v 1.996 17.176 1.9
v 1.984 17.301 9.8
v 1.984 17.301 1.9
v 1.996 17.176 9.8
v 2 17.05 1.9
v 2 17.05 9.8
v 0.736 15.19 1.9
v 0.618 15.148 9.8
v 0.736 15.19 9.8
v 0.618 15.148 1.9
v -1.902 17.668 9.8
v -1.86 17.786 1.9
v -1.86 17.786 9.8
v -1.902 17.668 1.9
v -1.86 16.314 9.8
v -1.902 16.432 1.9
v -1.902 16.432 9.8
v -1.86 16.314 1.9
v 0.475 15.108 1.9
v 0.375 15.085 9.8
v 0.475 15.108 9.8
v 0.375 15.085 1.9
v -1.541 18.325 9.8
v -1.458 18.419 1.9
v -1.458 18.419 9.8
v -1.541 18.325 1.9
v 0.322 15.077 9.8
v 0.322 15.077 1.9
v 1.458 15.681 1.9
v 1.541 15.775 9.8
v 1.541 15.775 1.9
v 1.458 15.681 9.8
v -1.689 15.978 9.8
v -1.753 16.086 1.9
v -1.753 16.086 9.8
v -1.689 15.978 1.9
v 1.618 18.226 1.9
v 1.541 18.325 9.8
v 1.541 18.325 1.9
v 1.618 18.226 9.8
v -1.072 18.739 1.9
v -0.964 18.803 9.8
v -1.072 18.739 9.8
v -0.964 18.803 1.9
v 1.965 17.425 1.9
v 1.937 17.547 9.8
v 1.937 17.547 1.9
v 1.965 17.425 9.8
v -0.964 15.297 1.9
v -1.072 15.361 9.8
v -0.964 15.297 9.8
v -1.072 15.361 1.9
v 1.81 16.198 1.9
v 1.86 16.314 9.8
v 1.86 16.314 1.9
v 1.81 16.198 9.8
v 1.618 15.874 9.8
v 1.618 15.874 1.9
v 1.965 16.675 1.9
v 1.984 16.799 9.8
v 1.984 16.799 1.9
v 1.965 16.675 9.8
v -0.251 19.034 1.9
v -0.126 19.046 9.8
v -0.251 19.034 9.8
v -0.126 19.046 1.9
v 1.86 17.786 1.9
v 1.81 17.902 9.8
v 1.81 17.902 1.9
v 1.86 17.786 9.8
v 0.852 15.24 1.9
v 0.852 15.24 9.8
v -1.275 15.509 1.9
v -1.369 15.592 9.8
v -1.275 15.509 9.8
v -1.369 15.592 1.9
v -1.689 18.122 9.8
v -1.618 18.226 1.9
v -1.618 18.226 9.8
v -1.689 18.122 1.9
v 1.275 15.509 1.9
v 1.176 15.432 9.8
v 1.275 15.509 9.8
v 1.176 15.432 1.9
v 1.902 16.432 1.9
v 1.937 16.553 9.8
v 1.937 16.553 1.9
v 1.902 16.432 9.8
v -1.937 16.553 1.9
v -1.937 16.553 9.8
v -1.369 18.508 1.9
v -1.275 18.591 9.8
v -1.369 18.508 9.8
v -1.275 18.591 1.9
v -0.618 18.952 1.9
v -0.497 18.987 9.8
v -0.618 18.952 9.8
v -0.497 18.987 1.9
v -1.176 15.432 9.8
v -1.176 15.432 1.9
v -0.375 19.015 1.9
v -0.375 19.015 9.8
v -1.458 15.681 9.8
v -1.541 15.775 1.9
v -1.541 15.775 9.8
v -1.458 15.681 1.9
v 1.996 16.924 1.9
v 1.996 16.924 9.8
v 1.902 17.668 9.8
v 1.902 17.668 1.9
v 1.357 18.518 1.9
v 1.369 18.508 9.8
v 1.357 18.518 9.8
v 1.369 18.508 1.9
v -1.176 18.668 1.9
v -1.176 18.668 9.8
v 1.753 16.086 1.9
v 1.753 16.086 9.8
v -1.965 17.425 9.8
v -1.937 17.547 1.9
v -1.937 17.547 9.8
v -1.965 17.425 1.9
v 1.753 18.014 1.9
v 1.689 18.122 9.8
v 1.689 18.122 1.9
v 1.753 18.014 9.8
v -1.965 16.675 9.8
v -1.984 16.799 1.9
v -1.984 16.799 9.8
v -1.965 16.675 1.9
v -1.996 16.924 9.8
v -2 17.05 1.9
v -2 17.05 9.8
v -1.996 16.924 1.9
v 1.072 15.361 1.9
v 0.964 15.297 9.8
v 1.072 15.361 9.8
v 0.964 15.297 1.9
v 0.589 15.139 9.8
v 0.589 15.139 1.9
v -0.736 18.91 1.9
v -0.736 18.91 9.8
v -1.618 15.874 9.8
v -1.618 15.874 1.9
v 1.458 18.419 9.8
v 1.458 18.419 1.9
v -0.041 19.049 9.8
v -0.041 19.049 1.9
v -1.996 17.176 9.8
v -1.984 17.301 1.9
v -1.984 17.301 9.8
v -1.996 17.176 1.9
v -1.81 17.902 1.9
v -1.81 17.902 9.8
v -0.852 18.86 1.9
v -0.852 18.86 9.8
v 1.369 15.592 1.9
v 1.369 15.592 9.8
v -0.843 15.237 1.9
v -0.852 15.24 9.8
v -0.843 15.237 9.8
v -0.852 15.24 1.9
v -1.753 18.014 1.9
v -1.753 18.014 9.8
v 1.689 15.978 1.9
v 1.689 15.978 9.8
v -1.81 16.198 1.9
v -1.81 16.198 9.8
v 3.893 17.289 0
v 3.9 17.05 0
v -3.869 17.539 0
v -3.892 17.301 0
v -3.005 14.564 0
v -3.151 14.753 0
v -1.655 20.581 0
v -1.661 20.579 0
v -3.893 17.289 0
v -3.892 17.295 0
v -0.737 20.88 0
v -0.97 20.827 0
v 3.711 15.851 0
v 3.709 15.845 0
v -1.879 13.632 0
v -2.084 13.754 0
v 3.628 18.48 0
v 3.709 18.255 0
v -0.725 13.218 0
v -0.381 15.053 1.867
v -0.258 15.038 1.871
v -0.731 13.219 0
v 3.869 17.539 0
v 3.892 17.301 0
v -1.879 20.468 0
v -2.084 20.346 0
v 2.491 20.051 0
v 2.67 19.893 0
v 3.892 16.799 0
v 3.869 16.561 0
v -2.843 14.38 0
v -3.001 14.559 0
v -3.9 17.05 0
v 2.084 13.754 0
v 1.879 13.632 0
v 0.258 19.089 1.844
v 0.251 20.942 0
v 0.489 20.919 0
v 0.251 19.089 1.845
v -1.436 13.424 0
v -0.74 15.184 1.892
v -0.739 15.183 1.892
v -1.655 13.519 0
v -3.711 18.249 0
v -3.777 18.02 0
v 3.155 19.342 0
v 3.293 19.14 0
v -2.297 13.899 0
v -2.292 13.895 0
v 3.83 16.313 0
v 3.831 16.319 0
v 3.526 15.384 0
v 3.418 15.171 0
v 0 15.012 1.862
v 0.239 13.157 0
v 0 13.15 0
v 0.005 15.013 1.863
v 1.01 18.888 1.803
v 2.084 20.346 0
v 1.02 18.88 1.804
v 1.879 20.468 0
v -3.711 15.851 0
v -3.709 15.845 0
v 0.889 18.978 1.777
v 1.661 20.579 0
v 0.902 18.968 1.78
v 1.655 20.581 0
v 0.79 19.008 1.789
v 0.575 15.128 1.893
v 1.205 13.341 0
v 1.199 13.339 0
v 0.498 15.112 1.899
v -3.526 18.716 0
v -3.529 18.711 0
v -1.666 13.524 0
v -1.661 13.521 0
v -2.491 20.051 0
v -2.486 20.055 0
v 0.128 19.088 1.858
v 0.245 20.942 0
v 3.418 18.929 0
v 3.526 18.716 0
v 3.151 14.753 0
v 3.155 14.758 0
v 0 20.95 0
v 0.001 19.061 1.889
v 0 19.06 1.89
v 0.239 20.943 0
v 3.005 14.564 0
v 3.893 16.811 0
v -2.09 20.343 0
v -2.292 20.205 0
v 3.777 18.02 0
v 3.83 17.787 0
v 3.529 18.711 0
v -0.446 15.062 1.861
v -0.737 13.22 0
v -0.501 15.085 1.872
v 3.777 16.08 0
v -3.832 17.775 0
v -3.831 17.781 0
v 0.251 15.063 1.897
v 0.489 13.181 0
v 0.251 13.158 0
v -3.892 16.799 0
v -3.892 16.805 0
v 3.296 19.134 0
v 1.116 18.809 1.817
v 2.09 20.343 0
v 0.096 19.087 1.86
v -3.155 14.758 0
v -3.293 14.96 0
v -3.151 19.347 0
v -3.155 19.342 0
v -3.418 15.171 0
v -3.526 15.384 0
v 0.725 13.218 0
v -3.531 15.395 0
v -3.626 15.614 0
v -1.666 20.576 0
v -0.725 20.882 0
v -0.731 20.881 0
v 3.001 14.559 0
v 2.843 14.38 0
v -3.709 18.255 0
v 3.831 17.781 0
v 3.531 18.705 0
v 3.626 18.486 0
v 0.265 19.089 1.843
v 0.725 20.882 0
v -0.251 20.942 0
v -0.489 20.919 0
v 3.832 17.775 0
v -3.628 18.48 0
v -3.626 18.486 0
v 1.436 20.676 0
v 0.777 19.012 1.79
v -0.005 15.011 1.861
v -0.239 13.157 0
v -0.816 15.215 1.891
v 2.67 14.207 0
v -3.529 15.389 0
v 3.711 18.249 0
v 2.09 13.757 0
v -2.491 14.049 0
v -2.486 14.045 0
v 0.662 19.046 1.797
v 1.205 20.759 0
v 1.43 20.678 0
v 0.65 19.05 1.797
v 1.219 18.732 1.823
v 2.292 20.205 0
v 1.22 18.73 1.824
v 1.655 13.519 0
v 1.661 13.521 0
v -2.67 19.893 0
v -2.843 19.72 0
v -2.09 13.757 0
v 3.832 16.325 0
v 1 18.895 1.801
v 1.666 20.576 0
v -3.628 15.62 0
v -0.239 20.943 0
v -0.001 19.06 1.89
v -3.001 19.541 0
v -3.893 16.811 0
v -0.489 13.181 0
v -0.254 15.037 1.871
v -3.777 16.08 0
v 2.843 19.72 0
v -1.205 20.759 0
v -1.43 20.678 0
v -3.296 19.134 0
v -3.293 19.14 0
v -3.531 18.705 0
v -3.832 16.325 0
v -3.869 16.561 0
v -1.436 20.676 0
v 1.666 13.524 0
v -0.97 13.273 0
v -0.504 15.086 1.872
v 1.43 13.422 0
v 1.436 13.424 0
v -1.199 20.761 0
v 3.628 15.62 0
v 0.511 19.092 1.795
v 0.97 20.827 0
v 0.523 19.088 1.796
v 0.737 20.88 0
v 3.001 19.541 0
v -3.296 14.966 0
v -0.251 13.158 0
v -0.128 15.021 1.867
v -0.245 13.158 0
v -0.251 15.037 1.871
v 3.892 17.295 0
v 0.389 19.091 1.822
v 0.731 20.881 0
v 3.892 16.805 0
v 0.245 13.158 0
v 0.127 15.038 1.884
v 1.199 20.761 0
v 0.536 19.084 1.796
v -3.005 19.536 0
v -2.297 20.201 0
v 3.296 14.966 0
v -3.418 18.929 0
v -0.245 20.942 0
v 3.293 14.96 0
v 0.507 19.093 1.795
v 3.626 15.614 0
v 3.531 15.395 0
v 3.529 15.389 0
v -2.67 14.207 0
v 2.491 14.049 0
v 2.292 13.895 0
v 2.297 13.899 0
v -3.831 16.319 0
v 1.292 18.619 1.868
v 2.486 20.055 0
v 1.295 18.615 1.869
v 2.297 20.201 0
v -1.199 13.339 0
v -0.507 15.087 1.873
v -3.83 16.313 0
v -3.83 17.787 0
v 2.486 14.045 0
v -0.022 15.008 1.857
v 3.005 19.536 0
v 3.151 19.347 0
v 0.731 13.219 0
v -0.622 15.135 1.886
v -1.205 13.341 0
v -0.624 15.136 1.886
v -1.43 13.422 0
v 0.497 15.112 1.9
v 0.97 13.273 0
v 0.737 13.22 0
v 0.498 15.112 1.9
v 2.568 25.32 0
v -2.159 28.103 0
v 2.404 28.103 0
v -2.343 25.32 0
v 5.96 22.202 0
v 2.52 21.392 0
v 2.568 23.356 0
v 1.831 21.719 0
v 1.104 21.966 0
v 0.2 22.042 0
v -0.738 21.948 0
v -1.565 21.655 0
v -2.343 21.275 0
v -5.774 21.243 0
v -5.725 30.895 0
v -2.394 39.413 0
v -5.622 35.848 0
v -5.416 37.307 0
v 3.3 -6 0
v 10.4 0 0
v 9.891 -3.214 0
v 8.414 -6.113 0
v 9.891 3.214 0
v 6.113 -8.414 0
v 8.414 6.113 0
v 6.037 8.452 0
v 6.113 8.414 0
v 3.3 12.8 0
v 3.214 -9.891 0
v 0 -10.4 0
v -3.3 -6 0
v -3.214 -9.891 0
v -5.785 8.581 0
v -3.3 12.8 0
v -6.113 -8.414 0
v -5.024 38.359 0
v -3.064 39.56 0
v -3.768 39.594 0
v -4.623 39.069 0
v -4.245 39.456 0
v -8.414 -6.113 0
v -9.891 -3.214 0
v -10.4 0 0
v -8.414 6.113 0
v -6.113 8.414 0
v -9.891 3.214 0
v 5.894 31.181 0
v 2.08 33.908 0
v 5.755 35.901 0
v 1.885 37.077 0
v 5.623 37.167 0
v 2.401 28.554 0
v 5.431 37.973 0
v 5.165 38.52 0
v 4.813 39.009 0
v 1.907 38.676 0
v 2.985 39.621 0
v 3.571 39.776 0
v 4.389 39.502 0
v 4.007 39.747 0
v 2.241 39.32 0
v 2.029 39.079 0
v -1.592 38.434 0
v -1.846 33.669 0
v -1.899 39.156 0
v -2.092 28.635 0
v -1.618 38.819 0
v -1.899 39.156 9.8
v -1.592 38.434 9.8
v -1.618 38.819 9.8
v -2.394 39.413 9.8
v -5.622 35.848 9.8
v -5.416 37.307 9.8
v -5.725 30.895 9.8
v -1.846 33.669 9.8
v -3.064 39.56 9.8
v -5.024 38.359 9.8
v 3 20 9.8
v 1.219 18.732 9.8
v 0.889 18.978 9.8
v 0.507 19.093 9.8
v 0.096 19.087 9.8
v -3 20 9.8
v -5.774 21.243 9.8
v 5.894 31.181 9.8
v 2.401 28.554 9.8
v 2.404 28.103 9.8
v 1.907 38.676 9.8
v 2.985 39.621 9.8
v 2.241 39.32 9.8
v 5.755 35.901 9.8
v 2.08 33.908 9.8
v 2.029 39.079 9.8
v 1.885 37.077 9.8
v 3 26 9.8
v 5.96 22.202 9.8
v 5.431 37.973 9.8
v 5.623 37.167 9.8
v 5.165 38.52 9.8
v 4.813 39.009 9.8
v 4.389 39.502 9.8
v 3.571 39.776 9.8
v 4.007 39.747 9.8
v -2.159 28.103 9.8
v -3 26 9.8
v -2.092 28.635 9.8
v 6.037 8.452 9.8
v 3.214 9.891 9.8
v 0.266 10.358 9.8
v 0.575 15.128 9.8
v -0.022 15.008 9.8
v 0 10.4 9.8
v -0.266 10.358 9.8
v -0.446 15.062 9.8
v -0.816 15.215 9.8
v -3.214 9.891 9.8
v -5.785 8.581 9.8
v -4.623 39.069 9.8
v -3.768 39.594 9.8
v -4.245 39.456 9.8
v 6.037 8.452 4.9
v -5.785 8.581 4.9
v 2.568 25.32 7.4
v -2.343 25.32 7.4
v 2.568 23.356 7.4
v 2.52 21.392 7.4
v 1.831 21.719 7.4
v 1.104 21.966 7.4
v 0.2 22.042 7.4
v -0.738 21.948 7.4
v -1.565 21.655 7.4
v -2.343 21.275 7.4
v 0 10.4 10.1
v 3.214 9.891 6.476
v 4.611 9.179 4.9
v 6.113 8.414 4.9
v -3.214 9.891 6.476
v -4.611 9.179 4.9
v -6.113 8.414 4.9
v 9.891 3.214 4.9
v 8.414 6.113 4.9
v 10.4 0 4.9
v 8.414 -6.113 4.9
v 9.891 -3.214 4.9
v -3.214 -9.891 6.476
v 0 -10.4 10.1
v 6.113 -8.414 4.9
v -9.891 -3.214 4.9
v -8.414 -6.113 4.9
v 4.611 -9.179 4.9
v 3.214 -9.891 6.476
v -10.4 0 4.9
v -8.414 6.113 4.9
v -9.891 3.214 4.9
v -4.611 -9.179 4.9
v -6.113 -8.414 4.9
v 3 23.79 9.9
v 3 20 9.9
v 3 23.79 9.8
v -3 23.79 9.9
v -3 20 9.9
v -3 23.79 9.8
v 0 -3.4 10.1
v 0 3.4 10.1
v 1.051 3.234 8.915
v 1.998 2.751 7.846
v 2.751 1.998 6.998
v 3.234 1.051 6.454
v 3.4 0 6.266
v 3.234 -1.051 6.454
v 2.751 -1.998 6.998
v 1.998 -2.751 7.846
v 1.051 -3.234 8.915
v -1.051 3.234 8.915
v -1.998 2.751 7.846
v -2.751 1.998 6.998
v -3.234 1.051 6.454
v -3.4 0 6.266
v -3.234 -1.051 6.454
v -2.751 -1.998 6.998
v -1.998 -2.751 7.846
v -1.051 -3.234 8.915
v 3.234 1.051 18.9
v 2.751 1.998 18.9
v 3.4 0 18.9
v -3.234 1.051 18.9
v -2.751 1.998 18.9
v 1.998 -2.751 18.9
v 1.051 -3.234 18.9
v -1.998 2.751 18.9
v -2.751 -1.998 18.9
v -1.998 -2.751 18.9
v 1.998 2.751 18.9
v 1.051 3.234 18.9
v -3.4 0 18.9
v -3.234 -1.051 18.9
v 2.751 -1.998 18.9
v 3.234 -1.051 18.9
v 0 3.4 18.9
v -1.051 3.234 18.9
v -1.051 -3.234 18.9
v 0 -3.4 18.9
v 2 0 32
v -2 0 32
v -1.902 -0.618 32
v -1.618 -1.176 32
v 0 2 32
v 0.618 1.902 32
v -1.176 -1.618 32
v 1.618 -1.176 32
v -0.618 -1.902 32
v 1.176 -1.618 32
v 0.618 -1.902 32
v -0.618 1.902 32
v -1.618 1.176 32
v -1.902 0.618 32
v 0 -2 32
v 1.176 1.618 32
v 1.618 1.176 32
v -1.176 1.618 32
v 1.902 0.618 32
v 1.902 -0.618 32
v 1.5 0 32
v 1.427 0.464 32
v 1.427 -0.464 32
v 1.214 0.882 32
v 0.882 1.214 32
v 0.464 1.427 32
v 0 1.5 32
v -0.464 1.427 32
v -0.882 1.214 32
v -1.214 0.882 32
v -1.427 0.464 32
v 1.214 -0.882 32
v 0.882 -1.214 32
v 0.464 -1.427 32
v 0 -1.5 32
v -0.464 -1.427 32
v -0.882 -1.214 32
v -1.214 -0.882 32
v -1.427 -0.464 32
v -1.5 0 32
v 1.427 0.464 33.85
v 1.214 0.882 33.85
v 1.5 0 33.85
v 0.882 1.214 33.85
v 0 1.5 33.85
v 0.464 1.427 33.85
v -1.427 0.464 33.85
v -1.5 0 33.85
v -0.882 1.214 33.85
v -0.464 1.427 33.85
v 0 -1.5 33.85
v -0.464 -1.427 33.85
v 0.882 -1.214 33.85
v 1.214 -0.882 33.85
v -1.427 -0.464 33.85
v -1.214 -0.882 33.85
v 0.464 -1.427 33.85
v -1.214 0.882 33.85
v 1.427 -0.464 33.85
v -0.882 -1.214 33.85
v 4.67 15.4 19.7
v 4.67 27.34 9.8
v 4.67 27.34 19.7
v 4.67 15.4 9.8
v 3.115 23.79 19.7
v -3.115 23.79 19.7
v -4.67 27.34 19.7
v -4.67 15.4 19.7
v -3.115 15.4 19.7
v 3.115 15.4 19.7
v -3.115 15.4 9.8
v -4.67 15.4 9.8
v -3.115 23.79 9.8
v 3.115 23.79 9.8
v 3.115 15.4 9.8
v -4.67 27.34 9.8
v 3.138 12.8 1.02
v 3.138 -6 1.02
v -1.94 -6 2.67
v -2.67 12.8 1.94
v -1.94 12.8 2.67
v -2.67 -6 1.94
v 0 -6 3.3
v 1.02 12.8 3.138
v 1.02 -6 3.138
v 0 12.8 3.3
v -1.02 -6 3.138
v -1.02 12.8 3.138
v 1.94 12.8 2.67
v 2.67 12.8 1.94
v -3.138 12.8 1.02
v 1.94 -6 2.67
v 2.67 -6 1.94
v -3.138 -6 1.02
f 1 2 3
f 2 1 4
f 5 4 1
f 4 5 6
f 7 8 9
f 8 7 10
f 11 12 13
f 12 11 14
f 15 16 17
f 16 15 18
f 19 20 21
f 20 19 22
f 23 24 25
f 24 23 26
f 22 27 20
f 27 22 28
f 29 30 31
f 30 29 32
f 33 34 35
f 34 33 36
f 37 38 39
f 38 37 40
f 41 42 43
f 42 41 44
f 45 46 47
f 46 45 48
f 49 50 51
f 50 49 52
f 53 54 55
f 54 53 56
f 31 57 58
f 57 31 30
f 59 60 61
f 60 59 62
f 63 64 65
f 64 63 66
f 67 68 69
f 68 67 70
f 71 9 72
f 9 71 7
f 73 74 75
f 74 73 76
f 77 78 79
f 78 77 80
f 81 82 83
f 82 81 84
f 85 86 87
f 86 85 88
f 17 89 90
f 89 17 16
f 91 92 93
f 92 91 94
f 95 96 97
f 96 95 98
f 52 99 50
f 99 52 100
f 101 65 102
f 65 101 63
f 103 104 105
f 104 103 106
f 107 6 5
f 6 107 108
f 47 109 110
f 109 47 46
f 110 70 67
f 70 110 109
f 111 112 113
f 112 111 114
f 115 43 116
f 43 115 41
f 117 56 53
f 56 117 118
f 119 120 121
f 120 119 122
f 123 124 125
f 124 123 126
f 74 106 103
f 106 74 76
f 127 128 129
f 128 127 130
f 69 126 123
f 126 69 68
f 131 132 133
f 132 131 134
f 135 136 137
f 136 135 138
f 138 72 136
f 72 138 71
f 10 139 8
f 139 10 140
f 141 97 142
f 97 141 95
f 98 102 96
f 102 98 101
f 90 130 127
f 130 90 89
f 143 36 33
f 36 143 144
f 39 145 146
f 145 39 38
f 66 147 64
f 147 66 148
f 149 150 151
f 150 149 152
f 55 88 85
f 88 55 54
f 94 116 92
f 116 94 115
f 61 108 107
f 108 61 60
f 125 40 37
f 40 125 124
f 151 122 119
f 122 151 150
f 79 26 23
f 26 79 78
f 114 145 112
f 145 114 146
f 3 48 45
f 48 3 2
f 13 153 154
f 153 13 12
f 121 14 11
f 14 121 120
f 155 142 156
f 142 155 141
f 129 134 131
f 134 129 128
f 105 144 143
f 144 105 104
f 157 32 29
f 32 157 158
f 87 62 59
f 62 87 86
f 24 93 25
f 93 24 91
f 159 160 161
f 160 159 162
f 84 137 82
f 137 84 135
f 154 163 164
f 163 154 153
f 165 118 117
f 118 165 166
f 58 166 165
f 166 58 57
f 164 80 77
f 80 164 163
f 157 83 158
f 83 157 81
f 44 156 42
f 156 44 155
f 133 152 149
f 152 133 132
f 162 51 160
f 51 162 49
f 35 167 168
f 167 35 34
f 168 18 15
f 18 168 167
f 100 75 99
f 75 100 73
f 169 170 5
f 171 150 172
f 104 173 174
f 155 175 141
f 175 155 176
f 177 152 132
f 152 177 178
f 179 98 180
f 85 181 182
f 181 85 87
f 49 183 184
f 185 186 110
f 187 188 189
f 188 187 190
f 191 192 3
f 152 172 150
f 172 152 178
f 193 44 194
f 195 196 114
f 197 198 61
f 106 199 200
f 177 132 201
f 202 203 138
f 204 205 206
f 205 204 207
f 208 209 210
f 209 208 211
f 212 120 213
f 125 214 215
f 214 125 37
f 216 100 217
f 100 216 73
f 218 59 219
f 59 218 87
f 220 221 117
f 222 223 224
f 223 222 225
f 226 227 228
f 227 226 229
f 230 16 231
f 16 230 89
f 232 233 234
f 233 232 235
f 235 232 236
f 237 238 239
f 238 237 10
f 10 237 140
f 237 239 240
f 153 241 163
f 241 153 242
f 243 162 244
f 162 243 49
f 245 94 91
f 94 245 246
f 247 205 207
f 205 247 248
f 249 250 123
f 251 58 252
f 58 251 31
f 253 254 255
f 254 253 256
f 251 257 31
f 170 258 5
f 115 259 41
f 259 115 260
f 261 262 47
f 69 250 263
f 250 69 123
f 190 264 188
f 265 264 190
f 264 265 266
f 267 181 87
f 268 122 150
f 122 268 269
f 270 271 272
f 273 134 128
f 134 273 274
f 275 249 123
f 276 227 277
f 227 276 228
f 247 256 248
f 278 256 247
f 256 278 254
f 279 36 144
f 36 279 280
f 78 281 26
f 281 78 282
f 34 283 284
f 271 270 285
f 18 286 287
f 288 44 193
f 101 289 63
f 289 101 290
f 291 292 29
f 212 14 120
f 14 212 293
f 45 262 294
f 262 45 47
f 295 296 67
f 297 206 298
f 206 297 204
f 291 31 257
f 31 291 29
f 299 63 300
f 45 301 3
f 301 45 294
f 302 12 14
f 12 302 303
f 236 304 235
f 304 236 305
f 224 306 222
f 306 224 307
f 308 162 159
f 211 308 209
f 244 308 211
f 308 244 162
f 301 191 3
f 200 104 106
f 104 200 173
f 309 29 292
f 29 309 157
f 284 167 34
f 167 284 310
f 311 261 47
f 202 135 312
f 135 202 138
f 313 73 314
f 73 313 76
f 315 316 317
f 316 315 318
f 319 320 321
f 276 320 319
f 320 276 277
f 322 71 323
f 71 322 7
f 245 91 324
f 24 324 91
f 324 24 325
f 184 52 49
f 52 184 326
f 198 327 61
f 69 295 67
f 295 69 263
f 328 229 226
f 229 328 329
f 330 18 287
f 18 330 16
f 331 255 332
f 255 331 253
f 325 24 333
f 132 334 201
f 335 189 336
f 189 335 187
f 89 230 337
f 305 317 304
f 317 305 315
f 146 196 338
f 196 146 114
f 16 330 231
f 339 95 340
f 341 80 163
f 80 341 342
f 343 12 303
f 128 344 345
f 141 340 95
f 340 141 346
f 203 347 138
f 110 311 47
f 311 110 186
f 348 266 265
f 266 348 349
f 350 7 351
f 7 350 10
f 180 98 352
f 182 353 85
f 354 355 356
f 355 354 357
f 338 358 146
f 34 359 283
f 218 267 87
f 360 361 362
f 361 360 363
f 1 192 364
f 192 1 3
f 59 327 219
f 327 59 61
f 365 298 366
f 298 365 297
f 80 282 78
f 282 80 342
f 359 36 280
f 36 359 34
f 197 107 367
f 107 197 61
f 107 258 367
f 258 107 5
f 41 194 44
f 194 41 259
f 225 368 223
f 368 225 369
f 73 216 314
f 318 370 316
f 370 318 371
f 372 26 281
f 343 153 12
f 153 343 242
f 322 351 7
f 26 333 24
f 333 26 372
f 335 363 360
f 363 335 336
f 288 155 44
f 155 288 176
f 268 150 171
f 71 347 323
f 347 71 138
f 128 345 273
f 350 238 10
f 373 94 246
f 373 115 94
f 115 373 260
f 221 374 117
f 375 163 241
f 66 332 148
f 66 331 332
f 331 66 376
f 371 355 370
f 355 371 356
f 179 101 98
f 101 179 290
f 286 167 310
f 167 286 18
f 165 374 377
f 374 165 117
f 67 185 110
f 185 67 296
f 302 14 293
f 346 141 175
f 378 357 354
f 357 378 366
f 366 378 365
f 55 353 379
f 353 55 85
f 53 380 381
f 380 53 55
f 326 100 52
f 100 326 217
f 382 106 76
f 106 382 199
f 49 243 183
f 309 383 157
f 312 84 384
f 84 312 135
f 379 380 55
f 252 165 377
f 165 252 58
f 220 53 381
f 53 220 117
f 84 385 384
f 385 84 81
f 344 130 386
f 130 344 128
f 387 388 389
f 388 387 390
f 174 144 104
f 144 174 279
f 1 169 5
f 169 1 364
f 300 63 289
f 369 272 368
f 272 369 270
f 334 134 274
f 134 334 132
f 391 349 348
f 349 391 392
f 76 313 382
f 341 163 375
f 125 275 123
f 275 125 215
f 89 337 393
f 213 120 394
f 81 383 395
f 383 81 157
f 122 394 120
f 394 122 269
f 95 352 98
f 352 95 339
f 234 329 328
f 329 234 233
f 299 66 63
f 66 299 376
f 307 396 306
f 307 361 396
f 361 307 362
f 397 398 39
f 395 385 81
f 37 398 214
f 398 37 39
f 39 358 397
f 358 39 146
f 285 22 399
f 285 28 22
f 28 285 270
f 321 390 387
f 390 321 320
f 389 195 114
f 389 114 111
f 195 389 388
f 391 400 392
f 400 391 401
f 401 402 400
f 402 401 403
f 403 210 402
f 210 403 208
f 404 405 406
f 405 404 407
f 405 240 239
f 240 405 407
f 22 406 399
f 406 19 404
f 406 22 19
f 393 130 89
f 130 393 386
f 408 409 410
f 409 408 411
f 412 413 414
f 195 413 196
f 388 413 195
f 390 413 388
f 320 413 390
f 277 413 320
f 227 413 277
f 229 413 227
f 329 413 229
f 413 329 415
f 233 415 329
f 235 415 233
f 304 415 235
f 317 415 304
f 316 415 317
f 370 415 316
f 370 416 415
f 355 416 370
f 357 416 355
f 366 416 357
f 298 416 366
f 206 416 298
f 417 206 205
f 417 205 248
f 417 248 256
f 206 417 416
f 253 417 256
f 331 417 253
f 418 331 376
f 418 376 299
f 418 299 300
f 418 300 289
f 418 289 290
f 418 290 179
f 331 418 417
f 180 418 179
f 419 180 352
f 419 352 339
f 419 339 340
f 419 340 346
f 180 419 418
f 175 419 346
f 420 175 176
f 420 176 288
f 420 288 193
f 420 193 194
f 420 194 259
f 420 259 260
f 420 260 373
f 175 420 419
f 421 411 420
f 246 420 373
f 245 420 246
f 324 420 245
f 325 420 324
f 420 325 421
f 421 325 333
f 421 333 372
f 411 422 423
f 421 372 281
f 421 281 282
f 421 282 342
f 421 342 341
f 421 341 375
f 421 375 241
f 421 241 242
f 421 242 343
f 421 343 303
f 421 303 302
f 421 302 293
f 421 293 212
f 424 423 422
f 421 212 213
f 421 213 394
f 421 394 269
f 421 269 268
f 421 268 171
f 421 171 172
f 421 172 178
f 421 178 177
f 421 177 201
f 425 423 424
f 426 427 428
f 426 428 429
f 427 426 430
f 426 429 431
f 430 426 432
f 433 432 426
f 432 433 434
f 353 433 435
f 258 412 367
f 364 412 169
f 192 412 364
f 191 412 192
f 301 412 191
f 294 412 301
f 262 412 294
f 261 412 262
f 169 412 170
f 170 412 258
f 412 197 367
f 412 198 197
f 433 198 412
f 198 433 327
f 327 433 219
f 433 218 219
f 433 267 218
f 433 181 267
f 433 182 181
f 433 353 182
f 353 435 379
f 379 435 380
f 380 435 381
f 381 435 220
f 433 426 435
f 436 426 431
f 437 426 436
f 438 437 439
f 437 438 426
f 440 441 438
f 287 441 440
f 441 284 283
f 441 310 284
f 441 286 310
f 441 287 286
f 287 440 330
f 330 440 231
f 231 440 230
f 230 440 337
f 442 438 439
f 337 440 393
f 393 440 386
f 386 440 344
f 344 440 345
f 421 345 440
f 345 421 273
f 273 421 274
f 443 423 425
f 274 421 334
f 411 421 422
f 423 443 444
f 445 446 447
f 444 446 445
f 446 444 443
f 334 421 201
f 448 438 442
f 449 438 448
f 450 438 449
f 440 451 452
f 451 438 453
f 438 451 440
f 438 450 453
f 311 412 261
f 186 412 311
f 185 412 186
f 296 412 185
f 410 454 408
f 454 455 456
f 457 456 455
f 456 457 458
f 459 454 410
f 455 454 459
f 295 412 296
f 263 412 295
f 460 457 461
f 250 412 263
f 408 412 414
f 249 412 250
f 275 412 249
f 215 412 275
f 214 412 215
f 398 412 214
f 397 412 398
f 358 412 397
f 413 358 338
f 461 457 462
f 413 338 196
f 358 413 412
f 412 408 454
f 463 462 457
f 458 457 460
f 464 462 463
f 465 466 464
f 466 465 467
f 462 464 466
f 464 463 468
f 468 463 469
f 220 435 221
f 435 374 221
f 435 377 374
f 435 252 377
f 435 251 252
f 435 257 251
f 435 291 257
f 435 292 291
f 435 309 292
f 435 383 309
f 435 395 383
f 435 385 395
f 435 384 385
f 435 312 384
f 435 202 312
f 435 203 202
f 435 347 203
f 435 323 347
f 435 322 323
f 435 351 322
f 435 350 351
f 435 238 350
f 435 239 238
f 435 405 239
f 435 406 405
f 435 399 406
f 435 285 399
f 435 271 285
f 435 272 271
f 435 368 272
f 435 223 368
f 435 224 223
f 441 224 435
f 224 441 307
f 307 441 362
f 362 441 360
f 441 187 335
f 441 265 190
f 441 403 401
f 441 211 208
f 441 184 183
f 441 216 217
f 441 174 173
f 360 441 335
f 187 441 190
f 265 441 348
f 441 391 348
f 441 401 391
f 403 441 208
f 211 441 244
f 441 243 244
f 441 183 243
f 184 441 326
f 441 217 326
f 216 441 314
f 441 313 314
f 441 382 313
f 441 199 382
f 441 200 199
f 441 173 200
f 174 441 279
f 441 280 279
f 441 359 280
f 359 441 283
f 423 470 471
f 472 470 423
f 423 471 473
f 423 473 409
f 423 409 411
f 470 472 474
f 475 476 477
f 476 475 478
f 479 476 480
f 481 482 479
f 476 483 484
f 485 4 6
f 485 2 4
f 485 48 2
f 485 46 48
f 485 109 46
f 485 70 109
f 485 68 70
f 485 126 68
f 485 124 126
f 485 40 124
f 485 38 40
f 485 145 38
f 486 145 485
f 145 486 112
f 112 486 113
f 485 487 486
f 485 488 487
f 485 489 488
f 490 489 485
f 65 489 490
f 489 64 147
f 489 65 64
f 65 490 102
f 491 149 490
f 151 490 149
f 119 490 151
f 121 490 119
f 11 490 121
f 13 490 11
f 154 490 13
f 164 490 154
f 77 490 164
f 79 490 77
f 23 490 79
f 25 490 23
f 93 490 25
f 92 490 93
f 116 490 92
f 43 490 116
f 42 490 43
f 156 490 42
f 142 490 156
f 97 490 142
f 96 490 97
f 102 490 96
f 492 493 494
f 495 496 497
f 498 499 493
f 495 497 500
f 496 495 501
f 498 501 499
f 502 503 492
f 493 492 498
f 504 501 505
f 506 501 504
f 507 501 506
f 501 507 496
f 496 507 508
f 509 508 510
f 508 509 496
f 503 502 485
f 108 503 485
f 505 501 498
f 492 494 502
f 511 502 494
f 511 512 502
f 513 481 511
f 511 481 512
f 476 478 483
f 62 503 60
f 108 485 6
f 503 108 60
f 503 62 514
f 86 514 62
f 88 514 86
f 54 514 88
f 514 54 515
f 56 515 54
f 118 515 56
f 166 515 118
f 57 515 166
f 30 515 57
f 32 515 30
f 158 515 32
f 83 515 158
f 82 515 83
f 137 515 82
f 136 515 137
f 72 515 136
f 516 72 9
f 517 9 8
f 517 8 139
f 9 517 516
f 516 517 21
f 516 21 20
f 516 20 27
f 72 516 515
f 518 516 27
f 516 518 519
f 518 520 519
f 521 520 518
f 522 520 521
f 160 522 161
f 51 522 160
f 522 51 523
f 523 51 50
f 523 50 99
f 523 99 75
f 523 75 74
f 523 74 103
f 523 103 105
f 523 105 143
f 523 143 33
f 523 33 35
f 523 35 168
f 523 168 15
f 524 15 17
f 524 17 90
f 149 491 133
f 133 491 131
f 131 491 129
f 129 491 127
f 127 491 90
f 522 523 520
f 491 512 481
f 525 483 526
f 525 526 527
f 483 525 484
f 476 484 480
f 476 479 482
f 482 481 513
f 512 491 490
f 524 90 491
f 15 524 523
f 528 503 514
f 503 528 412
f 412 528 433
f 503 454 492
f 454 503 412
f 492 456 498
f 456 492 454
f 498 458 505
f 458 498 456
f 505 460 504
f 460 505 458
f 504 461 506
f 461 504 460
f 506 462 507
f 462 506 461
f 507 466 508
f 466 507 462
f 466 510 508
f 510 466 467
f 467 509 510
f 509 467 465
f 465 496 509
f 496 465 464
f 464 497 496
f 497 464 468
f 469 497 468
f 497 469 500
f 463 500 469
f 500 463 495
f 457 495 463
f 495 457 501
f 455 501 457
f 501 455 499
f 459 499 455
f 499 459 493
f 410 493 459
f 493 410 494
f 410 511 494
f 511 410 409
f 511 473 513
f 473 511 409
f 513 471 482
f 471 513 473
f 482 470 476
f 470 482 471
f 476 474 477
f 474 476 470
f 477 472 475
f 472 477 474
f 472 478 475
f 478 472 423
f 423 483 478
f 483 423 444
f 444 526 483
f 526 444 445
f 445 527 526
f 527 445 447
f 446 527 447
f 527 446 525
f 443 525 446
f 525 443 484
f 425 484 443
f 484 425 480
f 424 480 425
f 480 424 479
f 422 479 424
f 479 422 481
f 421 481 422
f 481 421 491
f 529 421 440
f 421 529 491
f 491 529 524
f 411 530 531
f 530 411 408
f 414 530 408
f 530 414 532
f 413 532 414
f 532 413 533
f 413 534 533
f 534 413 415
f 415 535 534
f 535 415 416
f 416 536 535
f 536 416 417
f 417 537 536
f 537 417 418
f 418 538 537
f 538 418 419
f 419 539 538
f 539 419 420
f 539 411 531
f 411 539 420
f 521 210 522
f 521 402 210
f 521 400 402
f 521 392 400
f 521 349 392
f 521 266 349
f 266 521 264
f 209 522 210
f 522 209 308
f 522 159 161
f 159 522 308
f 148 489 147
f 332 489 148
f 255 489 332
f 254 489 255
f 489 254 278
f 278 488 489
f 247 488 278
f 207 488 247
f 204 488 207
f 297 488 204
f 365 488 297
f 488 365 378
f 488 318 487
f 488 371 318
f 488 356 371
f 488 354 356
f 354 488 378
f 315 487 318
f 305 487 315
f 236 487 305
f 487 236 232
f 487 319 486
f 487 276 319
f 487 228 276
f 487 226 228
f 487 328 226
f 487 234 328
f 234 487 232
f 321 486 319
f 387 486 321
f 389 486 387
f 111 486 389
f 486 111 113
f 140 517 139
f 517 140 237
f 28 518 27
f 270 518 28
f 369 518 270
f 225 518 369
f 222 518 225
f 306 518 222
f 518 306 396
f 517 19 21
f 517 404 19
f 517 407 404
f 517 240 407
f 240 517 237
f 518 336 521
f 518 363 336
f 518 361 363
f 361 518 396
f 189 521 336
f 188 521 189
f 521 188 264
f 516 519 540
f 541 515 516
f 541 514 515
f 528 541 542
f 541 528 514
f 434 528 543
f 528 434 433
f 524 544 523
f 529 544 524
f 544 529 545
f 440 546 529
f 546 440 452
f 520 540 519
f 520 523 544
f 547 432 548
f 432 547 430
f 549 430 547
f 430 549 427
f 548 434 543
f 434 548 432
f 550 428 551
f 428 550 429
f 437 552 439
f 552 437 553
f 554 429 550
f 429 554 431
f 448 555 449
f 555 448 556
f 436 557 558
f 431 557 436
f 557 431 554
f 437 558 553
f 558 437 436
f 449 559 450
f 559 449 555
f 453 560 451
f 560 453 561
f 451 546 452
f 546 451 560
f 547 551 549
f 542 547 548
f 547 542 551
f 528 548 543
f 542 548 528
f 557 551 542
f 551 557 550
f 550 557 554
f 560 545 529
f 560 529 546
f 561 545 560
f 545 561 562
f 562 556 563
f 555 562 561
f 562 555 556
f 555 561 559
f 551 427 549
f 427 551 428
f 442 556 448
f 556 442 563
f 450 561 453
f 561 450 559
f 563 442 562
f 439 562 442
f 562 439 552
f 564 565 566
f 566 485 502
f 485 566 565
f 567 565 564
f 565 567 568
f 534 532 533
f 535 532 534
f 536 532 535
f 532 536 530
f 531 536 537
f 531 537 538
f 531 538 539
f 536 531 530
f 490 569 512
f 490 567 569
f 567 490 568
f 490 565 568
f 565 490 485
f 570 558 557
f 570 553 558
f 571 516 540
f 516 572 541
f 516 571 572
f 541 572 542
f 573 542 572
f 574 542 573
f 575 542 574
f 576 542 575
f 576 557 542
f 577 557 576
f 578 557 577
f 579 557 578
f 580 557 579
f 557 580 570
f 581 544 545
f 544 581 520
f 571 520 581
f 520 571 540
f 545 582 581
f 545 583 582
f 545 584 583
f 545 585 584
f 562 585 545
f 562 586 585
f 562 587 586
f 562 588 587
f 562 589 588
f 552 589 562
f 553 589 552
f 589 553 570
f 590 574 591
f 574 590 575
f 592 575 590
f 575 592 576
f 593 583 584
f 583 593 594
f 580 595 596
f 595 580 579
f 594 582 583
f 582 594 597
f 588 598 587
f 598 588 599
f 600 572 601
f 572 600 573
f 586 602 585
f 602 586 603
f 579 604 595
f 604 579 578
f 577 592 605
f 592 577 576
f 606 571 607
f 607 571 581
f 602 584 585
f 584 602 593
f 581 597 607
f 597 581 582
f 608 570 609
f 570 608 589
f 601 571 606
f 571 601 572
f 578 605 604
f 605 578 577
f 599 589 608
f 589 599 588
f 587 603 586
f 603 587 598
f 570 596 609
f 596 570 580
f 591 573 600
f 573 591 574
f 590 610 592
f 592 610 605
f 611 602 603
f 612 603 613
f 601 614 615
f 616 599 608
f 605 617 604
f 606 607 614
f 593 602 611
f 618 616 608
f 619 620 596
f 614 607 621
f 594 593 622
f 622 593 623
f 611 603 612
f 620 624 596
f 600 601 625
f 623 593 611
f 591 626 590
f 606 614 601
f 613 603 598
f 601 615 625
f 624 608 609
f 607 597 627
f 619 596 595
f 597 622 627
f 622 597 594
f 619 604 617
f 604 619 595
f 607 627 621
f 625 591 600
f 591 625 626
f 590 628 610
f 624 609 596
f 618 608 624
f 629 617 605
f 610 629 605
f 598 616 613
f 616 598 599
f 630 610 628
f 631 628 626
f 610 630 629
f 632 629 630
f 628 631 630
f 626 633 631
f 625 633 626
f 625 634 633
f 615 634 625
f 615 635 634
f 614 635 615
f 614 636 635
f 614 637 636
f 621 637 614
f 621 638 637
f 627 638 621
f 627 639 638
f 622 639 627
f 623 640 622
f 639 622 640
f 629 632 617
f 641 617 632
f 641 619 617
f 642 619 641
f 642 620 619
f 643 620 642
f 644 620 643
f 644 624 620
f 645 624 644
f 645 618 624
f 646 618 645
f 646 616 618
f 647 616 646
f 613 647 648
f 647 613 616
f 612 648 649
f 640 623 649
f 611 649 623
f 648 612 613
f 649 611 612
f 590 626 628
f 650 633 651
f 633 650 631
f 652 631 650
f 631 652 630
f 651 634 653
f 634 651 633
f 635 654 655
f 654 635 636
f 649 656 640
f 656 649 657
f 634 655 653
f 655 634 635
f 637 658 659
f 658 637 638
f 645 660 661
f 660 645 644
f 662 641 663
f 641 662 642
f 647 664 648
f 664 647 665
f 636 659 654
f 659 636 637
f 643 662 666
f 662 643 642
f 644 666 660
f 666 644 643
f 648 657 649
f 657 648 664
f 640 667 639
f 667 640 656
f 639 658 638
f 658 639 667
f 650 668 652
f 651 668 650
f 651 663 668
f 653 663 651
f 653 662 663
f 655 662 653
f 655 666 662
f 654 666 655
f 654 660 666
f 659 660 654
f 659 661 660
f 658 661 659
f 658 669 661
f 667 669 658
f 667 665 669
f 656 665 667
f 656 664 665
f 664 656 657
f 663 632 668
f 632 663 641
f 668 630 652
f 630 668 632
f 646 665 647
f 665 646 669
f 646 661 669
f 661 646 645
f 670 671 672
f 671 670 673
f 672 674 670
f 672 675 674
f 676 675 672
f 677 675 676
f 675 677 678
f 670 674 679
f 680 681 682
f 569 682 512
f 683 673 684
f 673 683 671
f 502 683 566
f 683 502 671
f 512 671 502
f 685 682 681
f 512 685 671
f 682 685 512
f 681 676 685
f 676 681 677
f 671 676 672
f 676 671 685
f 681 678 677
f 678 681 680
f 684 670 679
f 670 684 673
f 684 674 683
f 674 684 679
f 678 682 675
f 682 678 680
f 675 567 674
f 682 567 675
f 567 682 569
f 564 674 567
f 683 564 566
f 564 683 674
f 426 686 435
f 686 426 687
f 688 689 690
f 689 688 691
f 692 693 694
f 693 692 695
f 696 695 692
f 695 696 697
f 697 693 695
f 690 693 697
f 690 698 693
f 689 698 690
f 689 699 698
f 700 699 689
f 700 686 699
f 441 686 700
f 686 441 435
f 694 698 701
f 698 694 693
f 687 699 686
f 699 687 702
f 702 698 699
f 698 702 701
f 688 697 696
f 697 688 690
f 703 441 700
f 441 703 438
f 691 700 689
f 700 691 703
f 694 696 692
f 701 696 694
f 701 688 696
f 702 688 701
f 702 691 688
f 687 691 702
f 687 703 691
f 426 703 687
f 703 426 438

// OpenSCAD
detail = 20;
marge = 0.5;
hauteur_socle = 9.8;
hauteur_cylindre_base = 4.9;
rayon_cylindre_base = 10.4;
hauteur_cylindre_haut = 14;
rayon_cylindre_haut = 3.4;
rayon_cylindre_creux = 5;
rayon_mini_cylindre = 1.5;
hauteur_mini_cylindre = 33.85;
rayon_cone = 2;
hauteur_cone = 13.1;
cote_triangle = 9.4;
hauteur_triangle = 5.3;
largeur_cube = 9.34;
longueur_cube = 11.94;
hauteur_cube = 9.9;
largeur_cube_inner = 6.23;
longueur_cube_inner = 8.34;


module cylindre_creux(){
	difference(){
		cylinder(h=100, r=2*rayon_cylindre_base, $fn=detail, center=true);
		cylinder(h=100, r=rayon_cylindre_base, $fn=detail, center=true);
	}
}

module vis(){
	cylinder (r1=2, r2=2, h=20, $fn=100);
	cylinder (r1=4, r2=2, h=2, $fn=100);
}

module socle(){
	translate([0,0,(hauteur_cylindre_base/2)]) color("blue") cylinder(h=hauteur_cylindre_base, r=rayon_cylindre_base, $fn=detail, center=true);
translate([-3,20,7.4]) cube([6,6,2.5]);
	difference(){
		translate([-10.2,-10.2,0]) linear_extrude(height=hauteur_socle) scale([0.58,0.58,1]) import("piece_enguerran_nb.dxf");
		translate([0,0,hauteur_cylindre_base]) cylinder(h=2*(hauteur_cylindre_base+marge), r=rayon_cylindre_base, $fn=detail, center=true);
		translate([0,17.05,-0.1]) color("pink") vis();
		
	}

}

module trapeze(){
	difference(){
		translate([-cote_triangle/2,0,0]) rotate([90,0,0]) linear_extrude(height=2*rayon_cylindre_base, center=true) polygon(points=[[0,0],[cote_triangle,0],[cote_triangle/2,hauteur_triangle]], paths=[[0,1,2]]);
		cylindre_creux();
	}
}

module pointe(){
	translate([0,0,(hauteur_cylindre_base)]) cylinder(h=hauteur_cylindre_haut, r=rayon_cylindre_haut, $fn=detail, center=true);
	translate([0,0,(hauteur_cylindre_base + hauteur_cylindre_haut/2 + hauteur_cone/2)]) color("red") cylinder(h=hauteur_cone, r1=rayon_cylindre_haut, r2=rayon_cone, $fn=detail, center=true);
	translate([0,0,(hauteur_mini_cylindre-hauteur_cylindre_haut)/2]) color("green") cylinder(h=hauteur_mini_cylindre, r=rayon_mini_cylindre, $fn=detail, center=true);
}

module cube_haut(){
	difference(){
		translate([0,longueur_cube/2,0]) cube([largeur_cube,longueur_cube,hauteur_cube], center=true);
		translate([0,longueur_cube_inner/2,0]) cube([largeur_cube_inner,longueur_cube_inner+0.1,hauteur_cube+0.1], center=true);
	}
}

module piece_complete(){
	difference(){
		union(){
			socle();
			translate([0,0,hauteur_cylindre_base-0.1]) color("green") trapeze();
			translate([0,0,hauteur_cylindre_haut/2]) pointe();
			translate([0,5+rayon_cylindre_base,hauteur_socle+hauteur_cube/2]) cube_haut();
		}
		translate([0,3.4,0]) rotate([90,0,0]) cylinder(h=18.8, r=3.3, $fn=detail, center=true);
		//cylinder(h=0.5, r=rayon_cylindre_base-3.3, $fn=detail, center=true);
	}
}




piece_complete();
